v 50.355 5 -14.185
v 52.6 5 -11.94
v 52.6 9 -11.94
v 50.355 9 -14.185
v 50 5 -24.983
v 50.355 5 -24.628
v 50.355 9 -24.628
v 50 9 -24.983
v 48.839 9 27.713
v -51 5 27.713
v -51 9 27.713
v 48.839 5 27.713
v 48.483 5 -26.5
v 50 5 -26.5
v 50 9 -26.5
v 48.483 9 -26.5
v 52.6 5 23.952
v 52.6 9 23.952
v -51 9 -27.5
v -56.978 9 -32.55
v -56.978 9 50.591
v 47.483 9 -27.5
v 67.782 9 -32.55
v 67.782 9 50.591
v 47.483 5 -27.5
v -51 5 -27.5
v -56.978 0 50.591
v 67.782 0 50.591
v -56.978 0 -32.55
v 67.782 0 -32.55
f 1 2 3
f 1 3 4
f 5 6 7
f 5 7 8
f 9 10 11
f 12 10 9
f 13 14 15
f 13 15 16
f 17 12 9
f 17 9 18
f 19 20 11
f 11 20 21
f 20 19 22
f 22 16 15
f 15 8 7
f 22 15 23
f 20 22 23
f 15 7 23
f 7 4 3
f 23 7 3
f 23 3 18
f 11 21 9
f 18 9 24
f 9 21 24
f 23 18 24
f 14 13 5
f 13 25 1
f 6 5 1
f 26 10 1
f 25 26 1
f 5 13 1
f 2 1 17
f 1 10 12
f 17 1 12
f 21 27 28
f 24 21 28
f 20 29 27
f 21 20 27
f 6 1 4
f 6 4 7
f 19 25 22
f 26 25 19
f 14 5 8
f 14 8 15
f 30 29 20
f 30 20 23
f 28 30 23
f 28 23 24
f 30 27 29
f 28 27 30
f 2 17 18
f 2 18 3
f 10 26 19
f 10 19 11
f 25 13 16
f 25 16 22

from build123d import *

# Parameters (mm, degrees)
SKETCH1_W           = 100
SKETCH1_H           = 53
BOSS_EXTRUDE1_DEPTH = 5
SKETCH2_R           = 1.5875
CUT_EXTRUDE1_DEPTH  = 57.808890149
SKETCH3_W           = 124.759549129
SKETCH3_H           = 83.141448462
BOSS_EXTRUDE2_DEPTH = 9
SKETCH4_W           = 124.759549129
SKETCH4_H           = 83.141448462
BOSS_EXTRUDE3_DEPTH = 5


with BuildPart() as part:
    # Sketch1 → Boss-Extrude1 (new body)
    with BuildSketch(Plane(origin=(0, 0, 0), x_dir=(1, 0, 0), z_dir=(0, 1, 0))):
        Rectangle(SKETCH1_W, SKETCH1_H)
    extrude(amount=BOSS_EXTRUDE1_DEPTH)

    # Sketch2 → Cut-Extrude1 (cut, through all)
    with BuildSketch(Plane.XZ):
        with Locations(Location((46.52, 24.173, 0), (0, 0, 270))):
            Circle(SKETCH2_R)
        with Locations(Location((40.17, -24.087, 0), (0, 0, 270))):
            Circle(SKETCH2_R)
        with Locations(Location((-34.76, -24.087, 0), (0, 0, 270))):
            Circle(SKETCH2_R)
        with Locations(Location((-36.03, 24.173, 0), (0, 0, 270))):
            Circle(SKETCH2_R)
    extrude(amount=-CUT_EXTRUDE1_DEPTH, mode=Mode.SUBTRACT)

    # Sketch3 → Boss-Extrude2 (add)
    with BuildSketch(Plane.XZ):
        with Locations((5.40179994, 9.020492383)):
            Rectangle(SKETCH3_W, SKETCH3_H)
        Polygon((52.6, -11.939816527), (50.354869769, -14.184946758), (50.354869769, -24.628213562), (50, -24.983083332), (50, -26.5), (48.483083332, -26.5), (47.483083332, -27.5), (-51, -27.5), (-51, 27.713), (48.839213562, 27.713), (52.6, 23.952213562), align=None, mode=Mode.SUBTRACT)
    extrude(amount=-BOSS_EXTRUDE2_DEPTH)

    # Sketch4 → Boss-Extrude3 (add)
    with BuildSketch(Plane.XZ):
        with Locations((5.40179994, 9.020492383)):
            Rectangle(SKETCH4_W, SKETCH4_H)
    extrude(amount=-BOSS_EXTRUDE3_DEPTH)


solid = part.part
